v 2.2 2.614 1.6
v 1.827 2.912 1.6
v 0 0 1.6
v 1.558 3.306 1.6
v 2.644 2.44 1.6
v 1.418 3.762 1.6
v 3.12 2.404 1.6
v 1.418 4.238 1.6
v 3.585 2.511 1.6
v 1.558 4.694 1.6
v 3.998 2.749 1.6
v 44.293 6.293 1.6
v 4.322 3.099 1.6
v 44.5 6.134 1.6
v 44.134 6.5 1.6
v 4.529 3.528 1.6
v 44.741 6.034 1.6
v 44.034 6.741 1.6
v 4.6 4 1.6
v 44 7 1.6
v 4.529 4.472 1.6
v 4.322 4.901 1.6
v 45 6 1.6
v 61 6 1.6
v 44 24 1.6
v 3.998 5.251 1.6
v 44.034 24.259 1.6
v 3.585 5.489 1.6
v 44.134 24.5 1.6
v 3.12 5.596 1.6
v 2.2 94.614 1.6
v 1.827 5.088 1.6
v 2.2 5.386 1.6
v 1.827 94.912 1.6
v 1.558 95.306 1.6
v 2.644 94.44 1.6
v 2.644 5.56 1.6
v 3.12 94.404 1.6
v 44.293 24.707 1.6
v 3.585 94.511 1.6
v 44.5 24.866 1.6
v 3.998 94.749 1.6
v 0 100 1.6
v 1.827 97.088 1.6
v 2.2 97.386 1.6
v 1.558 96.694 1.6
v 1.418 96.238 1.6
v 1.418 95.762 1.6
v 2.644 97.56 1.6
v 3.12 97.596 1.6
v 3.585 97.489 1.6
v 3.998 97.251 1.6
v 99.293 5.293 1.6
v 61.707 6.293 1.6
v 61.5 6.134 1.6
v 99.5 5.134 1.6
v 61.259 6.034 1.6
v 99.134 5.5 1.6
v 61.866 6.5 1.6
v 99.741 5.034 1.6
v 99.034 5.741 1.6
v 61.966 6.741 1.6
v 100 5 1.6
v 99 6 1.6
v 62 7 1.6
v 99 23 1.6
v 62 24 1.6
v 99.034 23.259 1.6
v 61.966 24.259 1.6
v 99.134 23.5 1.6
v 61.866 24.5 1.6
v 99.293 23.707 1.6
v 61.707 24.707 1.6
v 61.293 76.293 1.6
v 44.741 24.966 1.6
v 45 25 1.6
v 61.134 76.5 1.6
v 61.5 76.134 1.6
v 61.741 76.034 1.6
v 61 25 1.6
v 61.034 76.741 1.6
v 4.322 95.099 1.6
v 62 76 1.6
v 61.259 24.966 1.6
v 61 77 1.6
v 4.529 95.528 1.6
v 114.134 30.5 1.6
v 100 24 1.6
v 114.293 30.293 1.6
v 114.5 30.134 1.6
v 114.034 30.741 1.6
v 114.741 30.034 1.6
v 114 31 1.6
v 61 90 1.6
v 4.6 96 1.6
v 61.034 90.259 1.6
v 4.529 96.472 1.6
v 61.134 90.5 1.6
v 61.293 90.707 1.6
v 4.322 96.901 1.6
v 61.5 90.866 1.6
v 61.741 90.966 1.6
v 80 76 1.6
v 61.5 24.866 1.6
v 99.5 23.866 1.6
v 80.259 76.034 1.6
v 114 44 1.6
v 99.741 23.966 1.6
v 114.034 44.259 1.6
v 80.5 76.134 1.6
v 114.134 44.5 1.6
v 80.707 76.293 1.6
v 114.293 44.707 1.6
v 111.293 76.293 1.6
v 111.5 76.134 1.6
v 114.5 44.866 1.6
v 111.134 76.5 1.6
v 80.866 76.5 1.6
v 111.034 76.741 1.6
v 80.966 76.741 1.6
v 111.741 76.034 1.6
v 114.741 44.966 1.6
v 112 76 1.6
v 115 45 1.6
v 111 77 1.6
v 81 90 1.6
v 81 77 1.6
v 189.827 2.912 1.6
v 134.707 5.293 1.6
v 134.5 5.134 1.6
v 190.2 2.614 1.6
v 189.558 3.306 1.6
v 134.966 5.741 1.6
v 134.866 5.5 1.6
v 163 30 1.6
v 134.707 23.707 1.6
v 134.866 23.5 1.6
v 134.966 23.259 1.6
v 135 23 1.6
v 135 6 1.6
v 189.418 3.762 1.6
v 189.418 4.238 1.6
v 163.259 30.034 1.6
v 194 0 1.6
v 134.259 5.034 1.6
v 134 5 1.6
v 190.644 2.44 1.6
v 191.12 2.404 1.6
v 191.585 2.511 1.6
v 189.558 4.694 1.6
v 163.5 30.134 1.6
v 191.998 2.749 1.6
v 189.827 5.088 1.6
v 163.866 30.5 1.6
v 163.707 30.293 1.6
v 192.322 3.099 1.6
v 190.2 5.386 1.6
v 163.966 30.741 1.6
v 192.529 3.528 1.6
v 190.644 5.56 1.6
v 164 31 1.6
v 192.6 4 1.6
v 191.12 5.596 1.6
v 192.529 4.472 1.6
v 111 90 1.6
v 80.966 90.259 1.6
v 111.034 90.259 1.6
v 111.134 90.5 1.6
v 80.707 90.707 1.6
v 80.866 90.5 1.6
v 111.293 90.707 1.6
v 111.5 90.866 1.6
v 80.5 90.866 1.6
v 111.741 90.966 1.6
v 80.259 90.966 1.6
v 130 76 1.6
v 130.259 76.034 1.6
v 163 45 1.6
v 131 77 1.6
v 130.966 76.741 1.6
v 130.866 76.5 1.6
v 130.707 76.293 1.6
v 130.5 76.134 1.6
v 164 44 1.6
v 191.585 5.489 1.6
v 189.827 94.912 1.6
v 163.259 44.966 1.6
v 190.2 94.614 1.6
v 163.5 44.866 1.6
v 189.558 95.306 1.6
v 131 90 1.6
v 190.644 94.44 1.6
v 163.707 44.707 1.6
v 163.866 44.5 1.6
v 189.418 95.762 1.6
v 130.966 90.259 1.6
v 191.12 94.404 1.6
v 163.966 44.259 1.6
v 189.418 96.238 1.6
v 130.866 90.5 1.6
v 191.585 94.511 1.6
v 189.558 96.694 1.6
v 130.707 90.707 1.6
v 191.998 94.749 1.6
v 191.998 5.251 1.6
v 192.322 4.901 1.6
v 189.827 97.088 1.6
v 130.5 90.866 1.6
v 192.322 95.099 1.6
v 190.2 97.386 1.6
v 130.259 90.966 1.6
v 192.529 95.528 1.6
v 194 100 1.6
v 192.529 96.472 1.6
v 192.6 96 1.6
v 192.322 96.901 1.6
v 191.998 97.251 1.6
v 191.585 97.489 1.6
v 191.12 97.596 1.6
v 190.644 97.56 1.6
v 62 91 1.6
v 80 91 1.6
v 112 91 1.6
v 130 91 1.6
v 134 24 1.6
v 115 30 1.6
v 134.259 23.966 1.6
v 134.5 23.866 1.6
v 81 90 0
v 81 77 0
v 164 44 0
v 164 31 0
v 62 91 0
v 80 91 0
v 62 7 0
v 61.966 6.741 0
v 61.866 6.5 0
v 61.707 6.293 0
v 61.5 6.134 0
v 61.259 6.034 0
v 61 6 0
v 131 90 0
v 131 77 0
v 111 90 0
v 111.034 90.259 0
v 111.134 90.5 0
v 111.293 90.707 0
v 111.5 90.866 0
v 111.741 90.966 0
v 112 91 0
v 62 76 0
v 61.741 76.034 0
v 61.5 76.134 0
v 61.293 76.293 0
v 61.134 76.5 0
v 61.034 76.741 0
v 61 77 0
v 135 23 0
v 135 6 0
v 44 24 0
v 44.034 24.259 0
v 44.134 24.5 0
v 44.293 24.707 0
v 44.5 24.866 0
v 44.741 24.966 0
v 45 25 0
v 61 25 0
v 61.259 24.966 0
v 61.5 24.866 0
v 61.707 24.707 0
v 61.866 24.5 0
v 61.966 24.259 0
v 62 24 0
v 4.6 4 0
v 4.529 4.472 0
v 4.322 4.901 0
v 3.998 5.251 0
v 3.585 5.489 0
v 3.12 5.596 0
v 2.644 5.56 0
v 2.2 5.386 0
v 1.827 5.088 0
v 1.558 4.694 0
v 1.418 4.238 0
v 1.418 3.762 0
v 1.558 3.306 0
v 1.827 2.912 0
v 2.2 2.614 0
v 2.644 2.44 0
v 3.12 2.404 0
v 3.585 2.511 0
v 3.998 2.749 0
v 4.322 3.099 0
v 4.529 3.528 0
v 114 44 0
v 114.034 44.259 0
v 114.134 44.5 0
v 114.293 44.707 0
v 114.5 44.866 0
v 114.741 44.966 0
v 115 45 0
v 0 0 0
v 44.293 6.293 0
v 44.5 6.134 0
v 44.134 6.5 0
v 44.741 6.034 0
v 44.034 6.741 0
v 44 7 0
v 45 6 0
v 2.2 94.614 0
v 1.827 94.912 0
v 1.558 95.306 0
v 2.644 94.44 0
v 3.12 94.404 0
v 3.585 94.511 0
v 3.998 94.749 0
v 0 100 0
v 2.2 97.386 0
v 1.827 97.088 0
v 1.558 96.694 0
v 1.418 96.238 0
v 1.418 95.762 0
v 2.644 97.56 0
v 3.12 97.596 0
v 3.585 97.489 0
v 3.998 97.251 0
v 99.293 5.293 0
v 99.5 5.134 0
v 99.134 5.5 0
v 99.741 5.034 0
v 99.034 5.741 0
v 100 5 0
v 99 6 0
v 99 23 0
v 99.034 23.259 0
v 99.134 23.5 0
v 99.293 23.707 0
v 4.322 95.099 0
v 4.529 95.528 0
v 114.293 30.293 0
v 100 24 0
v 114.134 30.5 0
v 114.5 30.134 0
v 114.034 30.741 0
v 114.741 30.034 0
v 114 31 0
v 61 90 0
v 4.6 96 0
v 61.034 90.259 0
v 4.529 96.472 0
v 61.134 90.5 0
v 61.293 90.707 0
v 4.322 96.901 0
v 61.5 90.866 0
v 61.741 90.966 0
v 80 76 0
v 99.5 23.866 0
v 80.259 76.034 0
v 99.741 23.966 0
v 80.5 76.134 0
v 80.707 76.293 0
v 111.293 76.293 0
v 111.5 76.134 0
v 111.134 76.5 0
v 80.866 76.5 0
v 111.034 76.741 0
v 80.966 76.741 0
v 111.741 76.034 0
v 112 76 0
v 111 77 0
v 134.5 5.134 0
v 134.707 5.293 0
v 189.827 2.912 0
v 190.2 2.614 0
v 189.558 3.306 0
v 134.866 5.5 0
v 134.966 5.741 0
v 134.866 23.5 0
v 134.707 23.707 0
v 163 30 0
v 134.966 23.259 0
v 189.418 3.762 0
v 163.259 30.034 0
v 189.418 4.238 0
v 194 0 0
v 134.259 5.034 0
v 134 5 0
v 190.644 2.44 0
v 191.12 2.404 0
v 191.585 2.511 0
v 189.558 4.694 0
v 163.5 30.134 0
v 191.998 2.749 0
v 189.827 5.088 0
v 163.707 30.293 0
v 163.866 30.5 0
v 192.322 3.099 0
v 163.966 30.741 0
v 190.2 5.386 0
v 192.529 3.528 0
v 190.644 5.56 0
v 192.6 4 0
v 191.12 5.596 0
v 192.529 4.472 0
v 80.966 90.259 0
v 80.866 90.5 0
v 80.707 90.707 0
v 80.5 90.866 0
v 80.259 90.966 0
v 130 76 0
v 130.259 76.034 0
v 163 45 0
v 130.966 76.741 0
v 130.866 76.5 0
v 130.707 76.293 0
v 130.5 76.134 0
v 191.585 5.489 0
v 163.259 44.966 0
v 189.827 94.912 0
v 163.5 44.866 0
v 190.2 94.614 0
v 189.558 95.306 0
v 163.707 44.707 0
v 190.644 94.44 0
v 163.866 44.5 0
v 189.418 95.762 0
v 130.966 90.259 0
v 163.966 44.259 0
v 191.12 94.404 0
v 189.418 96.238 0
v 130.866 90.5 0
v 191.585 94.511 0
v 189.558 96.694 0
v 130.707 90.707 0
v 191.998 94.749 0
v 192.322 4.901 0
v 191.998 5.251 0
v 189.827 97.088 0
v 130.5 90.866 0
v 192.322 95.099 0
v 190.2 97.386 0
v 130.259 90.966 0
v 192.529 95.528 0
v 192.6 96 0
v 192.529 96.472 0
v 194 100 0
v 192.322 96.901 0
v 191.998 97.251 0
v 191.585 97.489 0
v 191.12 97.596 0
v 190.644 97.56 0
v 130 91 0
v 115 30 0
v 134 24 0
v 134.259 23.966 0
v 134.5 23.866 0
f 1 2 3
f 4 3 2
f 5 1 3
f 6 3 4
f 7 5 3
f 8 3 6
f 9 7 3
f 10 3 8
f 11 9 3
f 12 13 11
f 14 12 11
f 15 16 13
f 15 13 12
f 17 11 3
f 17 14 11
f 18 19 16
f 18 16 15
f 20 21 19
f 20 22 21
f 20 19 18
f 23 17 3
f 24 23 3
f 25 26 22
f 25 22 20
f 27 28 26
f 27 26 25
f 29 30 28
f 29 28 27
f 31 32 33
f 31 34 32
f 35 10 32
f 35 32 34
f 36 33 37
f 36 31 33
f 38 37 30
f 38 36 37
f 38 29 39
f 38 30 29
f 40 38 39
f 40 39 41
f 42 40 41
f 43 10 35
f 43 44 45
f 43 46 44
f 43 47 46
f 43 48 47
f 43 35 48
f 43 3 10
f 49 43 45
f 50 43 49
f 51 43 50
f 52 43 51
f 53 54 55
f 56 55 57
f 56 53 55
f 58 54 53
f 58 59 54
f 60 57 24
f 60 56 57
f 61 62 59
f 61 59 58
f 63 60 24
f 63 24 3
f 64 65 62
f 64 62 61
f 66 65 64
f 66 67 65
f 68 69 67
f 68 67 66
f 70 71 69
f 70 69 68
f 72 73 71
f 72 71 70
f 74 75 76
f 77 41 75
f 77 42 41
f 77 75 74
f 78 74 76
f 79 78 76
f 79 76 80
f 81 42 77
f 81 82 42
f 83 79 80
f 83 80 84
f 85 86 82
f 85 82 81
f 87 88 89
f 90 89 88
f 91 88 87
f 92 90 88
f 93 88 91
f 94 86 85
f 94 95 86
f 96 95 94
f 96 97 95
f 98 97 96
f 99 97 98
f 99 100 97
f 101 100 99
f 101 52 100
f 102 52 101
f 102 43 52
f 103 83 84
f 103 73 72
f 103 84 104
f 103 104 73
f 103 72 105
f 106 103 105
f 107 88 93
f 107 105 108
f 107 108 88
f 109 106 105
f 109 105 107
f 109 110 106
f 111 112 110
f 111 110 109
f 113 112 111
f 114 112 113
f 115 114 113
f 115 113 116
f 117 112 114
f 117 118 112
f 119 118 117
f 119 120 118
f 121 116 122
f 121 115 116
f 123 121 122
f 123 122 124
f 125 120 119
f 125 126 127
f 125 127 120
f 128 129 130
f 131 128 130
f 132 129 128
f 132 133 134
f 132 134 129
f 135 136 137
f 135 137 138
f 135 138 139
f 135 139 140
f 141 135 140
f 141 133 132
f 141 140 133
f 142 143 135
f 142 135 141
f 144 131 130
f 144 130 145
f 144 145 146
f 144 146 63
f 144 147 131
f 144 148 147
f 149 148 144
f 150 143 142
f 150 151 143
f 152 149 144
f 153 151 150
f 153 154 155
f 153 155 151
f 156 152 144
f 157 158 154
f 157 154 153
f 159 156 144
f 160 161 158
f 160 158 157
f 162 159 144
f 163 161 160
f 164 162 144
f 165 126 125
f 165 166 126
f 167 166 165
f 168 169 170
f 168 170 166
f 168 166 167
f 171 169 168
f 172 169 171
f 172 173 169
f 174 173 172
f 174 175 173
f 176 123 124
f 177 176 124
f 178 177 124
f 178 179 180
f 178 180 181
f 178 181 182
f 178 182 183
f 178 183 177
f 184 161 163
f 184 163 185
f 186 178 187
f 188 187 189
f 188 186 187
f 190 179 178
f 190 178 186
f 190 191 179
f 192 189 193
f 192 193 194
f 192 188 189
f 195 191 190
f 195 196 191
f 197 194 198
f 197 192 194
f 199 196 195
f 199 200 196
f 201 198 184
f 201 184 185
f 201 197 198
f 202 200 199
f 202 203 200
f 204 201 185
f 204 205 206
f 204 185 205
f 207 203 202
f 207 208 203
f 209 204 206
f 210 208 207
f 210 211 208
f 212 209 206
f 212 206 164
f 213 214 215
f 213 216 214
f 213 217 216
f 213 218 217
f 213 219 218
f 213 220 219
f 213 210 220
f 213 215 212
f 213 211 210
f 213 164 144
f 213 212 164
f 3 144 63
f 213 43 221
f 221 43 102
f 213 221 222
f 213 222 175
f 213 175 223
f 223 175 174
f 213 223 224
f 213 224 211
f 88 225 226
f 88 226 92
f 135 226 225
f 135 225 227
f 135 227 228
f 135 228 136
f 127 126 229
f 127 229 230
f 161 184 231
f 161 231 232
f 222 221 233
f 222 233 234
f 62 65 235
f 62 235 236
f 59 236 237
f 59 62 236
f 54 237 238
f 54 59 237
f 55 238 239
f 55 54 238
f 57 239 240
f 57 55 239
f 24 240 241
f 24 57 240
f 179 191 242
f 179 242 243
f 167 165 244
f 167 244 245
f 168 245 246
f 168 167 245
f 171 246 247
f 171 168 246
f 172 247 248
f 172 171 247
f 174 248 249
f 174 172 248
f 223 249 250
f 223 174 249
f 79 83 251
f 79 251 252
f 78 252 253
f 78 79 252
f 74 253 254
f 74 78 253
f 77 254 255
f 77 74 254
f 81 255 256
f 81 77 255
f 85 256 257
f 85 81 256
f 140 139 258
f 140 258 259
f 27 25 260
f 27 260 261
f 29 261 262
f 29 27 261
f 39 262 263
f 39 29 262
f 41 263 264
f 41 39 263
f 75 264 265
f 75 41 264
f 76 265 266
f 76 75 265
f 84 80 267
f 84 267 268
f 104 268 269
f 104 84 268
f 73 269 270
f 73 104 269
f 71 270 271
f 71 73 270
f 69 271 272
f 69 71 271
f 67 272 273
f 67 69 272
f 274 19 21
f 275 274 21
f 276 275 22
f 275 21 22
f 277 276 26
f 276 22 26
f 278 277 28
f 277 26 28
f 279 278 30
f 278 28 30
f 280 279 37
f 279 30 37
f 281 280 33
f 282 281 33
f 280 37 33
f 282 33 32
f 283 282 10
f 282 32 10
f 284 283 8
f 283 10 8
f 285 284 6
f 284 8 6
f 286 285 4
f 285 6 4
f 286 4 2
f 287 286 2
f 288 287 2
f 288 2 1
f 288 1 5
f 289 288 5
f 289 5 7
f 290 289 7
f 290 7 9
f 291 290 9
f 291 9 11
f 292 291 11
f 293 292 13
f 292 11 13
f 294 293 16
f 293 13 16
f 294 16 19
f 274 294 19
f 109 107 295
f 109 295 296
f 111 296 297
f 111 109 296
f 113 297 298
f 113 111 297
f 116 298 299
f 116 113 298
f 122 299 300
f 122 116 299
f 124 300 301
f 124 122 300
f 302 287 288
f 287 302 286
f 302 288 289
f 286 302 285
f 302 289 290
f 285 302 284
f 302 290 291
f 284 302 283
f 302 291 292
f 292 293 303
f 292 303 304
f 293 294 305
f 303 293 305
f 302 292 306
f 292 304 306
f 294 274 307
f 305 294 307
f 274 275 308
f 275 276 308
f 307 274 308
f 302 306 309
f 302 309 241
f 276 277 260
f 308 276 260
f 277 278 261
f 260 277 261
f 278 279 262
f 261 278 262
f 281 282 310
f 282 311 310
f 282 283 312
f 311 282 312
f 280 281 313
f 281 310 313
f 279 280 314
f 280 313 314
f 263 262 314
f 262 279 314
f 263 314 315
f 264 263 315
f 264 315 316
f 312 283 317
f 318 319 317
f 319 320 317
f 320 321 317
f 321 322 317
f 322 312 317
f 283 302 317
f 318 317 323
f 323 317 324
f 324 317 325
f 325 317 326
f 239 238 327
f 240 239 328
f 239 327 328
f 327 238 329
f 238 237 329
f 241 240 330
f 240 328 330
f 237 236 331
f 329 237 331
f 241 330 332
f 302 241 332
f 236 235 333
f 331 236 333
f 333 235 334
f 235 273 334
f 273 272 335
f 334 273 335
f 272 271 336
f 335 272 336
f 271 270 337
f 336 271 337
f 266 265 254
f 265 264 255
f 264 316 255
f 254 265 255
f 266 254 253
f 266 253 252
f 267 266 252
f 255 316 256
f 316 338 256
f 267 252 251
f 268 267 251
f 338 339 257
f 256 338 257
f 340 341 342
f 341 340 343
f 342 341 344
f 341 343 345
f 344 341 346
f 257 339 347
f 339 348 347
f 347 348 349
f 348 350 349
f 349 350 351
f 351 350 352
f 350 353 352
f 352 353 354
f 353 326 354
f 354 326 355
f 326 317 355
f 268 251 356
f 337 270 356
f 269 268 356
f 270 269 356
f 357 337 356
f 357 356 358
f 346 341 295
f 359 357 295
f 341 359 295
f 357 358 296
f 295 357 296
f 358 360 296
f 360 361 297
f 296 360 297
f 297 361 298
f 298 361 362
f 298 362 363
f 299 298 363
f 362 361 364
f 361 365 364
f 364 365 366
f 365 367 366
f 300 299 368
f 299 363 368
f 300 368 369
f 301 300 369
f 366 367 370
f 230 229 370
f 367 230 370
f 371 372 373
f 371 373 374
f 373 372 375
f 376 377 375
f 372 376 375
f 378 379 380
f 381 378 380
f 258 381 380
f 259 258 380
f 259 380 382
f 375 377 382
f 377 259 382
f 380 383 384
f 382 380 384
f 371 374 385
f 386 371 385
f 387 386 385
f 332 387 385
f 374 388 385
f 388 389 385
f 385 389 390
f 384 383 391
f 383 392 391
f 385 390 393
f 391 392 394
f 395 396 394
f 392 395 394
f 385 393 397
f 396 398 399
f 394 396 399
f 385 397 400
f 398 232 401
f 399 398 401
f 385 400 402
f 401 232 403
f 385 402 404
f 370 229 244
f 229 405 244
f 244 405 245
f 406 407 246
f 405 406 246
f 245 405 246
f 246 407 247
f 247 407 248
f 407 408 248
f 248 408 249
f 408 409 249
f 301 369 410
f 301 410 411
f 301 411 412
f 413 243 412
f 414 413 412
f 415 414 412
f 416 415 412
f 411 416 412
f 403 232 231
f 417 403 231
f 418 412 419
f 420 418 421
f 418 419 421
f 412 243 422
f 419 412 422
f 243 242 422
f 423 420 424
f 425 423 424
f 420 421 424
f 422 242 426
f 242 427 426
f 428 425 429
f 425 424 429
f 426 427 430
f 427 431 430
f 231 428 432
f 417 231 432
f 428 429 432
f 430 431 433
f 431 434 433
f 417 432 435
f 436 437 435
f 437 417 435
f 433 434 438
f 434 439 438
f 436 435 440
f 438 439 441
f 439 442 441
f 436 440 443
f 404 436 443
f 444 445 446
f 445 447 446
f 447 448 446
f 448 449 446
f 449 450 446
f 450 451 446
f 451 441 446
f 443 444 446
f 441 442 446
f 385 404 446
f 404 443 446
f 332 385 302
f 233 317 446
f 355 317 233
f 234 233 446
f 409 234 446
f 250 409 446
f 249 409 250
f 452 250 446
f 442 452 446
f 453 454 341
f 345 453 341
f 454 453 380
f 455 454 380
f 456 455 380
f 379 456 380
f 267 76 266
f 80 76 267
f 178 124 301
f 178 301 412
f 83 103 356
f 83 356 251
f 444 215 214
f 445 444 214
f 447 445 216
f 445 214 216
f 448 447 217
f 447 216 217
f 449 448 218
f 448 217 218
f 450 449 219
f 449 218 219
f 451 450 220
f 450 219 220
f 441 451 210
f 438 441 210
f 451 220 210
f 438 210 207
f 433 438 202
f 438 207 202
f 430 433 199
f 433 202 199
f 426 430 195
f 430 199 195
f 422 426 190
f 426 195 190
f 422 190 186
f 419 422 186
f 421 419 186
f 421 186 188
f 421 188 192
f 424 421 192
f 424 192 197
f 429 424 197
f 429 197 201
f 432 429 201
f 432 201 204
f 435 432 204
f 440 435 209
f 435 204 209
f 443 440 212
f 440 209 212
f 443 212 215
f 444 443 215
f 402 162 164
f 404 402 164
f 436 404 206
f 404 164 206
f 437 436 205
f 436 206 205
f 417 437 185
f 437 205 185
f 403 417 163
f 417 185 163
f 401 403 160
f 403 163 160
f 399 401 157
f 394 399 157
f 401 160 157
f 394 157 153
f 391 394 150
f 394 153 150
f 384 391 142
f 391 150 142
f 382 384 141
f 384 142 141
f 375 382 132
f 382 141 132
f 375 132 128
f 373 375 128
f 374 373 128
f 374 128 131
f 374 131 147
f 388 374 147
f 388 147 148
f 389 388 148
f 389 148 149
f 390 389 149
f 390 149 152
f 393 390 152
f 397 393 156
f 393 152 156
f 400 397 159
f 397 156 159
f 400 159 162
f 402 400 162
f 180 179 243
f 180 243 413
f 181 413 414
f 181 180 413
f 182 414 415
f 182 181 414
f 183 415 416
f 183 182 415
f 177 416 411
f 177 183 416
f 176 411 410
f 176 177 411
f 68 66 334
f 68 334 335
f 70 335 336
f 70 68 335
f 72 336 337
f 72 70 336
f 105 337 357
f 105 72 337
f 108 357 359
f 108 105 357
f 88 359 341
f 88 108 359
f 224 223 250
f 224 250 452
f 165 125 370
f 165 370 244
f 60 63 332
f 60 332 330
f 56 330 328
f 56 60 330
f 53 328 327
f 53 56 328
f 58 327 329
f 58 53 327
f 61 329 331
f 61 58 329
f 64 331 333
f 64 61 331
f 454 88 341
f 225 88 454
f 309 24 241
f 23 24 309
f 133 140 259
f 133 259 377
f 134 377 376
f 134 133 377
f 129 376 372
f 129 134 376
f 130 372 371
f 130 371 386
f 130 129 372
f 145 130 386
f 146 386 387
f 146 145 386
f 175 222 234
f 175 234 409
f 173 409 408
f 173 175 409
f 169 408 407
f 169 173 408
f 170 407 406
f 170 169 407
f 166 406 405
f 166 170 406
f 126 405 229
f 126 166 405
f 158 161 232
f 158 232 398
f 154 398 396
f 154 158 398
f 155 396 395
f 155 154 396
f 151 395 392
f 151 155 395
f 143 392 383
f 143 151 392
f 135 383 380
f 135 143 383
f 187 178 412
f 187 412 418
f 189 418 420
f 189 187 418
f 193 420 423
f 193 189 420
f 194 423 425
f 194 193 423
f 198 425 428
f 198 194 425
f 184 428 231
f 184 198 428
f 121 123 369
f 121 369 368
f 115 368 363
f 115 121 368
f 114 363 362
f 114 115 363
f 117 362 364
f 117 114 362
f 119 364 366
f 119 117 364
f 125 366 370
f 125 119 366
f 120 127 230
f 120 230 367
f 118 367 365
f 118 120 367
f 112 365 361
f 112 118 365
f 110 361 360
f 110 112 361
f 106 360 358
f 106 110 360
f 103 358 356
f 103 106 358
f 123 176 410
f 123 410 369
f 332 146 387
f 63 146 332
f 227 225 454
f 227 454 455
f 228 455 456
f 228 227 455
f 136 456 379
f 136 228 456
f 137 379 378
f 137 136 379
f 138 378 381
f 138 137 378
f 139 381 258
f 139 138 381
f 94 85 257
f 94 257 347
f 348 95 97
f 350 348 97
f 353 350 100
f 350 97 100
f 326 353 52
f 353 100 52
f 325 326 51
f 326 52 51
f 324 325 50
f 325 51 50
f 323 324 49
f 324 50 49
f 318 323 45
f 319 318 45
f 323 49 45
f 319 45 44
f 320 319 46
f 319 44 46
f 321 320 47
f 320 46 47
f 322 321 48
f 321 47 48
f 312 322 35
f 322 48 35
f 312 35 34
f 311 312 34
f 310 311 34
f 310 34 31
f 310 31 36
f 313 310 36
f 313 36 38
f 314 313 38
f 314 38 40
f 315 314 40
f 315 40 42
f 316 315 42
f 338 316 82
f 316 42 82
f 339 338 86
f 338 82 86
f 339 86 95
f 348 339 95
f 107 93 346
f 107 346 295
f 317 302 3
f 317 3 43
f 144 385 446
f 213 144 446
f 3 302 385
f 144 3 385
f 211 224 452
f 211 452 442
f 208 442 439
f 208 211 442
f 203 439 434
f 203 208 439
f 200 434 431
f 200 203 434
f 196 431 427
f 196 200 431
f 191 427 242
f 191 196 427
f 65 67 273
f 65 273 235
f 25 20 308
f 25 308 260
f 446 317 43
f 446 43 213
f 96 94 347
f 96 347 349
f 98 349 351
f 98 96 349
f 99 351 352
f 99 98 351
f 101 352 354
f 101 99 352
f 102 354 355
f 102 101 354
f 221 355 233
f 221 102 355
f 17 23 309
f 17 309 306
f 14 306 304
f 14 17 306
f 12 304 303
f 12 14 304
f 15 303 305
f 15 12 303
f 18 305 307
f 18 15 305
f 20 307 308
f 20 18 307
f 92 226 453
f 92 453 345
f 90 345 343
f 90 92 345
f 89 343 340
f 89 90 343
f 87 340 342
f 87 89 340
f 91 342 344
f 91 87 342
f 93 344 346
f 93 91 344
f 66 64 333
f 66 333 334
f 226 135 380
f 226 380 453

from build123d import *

# Parameters (mm, degrees)
ESQUISSE1_W             = 194
ESQUISSE1_H             = 100
BOSS_EXTRU_1_DEPTH      = 1.6
ESQUISSE2_R             = 1.6
ENL_V_MAT_EXTRU_1_DEPTH = 1.6


with BuildPart() as part:
    # Esquisse1 → Boss.-Extru.1 (new body)
    with BuildSketch(Plane.XY):
        with Locations((97, 50)):
            Rectangle(ESQUISSE1_W, ESQUISSE1_H)
    extrude(amount=BOSS_EXTRU_1_DEPTH)

    # Esquisse2 → Enlèv. mat.-Extru.1 (cut)
    with BuildSketch(Plane.XY.offset(1.6)):
        with Locations((3, 96)):
            Circle(ESQUISSE2_R)
        with Locations((191, 96)):
            Circle(ESQUISSE2_R)
        with Locations((191, 4)):
            Circle(ESQUISSE2_R)
        with Locations((3, 4)):
            Circle(ESQUISSE2_R)
        with BuildLine():
            Line((45, 25), (61, 25))
            ThreePointArc((61, 25), (61.707106781, 24.707106781), (62, 24))
            Line((62, 24), (62, 7))
            ThreePointArc((62, 7), (61.707106781, 6.292893219), (61, 6))
            Line((61, 6), (45, 6))
            ThreePointArc((45, 6), (44.292893219, 6.292893219), (44, 7))
            Line((44, 7), (44, 24))
            ThreePointArc((44, 24), (44.292893219, 24.707106781), (45, 25))
        make_face()
        with BuildLine():
            Line((62, 91), (80, 91))
            ThreePointArc((80, 91), (80.707106781, 90.707106781), (81, 90))
            Line((81, 90), (81, 77))
            ThreePointArc((81, 77), (80.707106781, 76.292893219), (80, 76))
            Line((80, 76), (62, 76))
            ThreePointArc((62, 76), (61.292893219, 76.292893219), (61, 77))
            Line((61, 77), (61, 90))
            ThreePointArc((61, 90), (61.292893219, 90.707106781), (62, 91))
        make_face()
        with BuildLine():
            Line((112, 91), (130, 91))
            ThreePointArc((130, 91), (130.707106781, 90.707106781), (131, 90))
            Line((131, 90), (131, 77))
            ThreePointArc((131, 77), (130.707106781, 76.292893219), (130, 76))
            Line((130, 76), (112, 76))
            ThreePointArc((112, 76), (111.292893219, 76.292893219), (111, 77))
            Line((111, 77), (111, 90))
            ThreePointArc((111, 90), (111.292893219, 90.707106781), (112, 91))
        make_face()
        with BuildLine():
            Line((115, 45), (163, 45))
            ThreePointArc((163, 45), (163.707106781, 44.707106781), (164, 44))
            Line((164, 44), (164, 31))
            ThreePointArc((164, 31), (163.707106781, 30.292893219), (163, 30))
            Line((163, 30), (115, 30))
            ThreePointArc((115, 30), (114.292893219, 30.292893219), (114, 31))
            Line((114, 31), (114, 44))
            ThreePointArc((114, 44), (114.292893219, 44.707106781), (115, 45))
        make_face()
        with BuildLine():
            Line((100, 24), (134, 24))
            ThreePointArc((134, 24), (134.707106781, 23.707106781), (135, 23))
            Line((135, 23), (135, 6))
            ThreePointArc((135, 6), (134.707106781, 5.292893219), (134, 5))
            Line((134, 5), (100, 5))
            ThreePointArc((100, 5), (99.292893219, 5.292893219), (99, 6))
            Line((99, 6), (99, 23))
            ThreePointArc((99, 23), (99.292893219, 23.707106781), (100, 24))
        make_face()
    extrude(amount=-ENL_V_MAT_EXTRU_1_DEPTH, mode=Mode.SUBTRACT)


solid = part.part
